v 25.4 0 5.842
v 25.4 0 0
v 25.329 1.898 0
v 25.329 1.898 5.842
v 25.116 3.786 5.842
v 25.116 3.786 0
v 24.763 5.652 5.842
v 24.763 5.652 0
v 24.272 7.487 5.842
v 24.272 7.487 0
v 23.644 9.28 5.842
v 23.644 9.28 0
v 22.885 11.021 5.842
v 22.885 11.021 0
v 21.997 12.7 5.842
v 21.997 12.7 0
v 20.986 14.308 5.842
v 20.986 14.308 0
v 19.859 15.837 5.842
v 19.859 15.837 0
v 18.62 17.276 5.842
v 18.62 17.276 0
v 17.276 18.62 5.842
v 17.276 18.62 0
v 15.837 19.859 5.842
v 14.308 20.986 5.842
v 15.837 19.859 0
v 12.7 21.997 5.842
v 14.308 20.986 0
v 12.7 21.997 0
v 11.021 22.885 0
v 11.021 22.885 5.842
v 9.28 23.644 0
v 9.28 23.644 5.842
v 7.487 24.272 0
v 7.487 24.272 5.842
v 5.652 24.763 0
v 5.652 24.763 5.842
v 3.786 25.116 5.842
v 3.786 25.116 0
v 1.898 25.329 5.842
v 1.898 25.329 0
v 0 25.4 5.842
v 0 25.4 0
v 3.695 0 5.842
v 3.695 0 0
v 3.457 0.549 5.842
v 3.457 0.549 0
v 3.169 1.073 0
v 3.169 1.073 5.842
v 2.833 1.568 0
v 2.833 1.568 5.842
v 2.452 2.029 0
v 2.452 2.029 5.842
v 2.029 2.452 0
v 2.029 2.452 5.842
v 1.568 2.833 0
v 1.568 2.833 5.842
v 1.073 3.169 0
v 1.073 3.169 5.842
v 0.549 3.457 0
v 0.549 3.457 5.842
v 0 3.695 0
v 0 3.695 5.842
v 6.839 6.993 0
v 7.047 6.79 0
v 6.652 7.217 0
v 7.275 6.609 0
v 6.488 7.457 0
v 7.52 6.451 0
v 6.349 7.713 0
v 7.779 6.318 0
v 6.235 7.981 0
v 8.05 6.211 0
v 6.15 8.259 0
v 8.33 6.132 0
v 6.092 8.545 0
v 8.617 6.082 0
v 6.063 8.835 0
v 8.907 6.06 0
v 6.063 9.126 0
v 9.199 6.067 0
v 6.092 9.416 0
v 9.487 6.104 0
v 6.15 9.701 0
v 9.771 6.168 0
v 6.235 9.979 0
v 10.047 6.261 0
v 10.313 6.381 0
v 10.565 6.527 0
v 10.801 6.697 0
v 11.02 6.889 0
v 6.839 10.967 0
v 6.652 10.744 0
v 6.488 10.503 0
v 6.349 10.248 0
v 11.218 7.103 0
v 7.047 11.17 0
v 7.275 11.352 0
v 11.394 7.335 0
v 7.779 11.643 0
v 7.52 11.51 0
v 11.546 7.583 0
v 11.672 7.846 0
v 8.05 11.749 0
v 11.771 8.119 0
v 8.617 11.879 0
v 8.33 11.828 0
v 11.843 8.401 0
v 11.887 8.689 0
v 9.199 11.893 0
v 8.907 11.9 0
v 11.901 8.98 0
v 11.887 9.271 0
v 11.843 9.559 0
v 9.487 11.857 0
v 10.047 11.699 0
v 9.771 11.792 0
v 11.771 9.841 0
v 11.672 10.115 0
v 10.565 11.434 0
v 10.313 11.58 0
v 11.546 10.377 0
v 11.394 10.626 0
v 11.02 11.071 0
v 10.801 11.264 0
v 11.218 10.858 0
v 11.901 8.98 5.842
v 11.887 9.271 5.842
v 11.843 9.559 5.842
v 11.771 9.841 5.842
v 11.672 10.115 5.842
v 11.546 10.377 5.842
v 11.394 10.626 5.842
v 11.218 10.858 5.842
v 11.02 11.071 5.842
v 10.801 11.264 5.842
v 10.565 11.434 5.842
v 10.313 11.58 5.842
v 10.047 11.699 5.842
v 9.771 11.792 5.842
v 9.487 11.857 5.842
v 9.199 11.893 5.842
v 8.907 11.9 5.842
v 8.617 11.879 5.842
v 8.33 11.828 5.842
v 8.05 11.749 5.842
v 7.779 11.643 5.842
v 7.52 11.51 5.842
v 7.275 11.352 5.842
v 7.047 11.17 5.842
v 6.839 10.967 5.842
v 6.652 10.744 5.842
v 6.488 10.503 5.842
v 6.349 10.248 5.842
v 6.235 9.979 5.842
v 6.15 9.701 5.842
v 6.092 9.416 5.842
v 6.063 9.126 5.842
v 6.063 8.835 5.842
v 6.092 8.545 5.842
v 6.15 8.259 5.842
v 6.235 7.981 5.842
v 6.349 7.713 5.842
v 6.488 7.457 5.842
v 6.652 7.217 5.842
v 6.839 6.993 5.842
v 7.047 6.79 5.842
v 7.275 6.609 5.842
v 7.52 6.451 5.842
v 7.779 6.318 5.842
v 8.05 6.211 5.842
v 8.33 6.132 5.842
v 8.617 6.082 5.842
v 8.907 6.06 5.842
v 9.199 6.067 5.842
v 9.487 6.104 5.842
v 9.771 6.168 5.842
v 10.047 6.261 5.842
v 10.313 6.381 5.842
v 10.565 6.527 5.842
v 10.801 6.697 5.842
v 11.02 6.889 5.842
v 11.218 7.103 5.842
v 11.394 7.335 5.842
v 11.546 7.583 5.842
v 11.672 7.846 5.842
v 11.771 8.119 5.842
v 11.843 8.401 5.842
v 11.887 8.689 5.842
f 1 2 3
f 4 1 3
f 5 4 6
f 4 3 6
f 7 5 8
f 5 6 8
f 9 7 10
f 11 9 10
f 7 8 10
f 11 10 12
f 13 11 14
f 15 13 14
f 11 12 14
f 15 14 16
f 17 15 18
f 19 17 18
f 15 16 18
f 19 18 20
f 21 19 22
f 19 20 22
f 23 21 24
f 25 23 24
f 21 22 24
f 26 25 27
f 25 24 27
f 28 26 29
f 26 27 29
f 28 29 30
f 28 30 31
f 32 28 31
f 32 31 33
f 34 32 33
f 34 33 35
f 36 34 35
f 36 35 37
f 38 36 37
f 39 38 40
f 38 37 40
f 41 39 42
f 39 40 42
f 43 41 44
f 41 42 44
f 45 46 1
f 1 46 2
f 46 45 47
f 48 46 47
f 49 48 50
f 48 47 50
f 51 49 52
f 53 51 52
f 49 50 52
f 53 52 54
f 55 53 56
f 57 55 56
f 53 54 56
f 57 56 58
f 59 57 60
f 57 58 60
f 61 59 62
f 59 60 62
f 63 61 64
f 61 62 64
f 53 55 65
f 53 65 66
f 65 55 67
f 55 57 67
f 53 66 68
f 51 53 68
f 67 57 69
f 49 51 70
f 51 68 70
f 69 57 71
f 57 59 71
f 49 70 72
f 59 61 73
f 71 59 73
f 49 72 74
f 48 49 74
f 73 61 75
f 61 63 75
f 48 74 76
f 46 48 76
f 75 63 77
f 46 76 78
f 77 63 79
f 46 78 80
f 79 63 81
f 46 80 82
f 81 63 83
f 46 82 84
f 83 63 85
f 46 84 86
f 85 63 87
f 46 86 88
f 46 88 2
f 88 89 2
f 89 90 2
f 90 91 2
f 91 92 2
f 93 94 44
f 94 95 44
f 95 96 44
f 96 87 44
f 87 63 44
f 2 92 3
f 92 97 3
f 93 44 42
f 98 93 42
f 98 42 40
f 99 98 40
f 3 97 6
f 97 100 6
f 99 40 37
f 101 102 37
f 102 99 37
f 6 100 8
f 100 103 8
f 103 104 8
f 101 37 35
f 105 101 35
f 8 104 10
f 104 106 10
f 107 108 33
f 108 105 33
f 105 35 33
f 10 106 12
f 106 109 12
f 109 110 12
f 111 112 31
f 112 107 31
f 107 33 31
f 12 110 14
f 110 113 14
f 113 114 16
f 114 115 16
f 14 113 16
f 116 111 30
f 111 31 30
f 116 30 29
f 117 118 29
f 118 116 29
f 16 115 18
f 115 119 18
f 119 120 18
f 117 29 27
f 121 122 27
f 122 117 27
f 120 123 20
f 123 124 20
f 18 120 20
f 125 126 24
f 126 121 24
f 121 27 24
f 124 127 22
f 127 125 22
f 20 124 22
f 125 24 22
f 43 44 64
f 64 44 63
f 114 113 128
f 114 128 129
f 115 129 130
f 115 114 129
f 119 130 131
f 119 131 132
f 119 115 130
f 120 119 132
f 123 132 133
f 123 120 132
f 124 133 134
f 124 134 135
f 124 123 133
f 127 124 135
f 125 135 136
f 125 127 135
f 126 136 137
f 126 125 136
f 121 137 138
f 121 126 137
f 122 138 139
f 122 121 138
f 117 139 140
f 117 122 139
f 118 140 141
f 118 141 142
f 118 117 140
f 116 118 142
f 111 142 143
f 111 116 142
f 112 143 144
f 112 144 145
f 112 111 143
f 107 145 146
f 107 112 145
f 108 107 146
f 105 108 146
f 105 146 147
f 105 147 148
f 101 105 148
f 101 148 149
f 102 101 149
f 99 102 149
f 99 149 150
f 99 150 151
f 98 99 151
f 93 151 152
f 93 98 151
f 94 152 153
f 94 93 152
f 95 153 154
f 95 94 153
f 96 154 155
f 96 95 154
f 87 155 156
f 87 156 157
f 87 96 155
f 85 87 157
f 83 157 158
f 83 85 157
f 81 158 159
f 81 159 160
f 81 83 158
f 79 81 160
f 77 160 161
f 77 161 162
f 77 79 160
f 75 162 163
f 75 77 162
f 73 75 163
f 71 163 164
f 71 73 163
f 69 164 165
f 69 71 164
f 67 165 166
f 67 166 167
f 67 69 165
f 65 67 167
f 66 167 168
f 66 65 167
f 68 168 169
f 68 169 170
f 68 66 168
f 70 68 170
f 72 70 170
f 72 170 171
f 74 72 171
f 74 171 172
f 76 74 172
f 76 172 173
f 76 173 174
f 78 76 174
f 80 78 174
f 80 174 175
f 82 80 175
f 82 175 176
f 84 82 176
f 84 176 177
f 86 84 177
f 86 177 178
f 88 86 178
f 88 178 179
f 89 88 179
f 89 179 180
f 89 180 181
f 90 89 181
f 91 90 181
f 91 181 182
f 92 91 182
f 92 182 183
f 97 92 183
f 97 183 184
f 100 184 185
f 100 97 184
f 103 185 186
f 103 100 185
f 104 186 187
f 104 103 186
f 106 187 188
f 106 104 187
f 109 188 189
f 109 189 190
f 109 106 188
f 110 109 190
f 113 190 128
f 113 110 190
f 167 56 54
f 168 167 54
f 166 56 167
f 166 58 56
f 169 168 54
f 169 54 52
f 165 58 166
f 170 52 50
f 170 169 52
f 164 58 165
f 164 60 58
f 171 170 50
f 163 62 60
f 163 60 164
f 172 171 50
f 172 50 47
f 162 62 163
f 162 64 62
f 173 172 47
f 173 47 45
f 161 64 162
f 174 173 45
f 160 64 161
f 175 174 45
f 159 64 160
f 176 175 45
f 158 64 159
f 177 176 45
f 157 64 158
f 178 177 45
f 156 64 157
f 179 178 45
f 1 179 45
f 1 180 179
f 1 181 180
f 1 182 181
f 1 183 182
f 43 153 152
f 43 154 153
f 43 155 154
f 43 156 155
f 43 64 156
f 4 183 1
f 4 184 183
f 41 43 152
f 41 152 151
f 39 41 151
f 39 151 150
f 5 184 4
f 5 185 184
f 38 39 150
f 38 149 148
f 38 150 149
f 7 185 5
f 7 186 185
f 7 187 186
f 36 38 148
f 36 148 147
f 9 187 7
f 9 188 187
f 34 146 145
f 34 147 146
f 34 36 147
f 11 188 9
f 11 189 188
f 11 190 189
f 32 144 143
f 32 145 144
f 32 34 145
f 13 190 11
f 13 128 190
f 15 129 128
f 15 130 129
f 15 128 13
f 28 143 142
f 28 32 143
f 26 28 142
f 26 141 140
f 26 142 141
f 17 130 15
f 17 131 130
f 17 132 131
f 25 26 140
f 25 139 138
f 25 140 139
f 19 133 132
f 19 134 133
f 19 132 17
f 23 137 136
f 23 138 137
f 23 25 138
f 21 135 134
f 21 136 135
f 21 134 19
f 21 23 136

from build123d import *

# Parameters (mm, degrees)
F0_R     = 2.921
F1_DEPTH = 5.842
F3_DEPTH = 5.842


with BuildPart() as f1:
    # F0 (on Top) → F1 (new body)
    with BuildSketch(Plane.XY):
        with BuildLine():
            Line((0, 25.4), (0, 0))
            Line((0, 0), (25.4, 0))
            ThreePointArc((25.4, 0), (17.9605122421, 17.9605122421), (0, 25.4))
        make_face()
        with Locations((8.9802561211, 8.9802561211)):
            Circle(F0_R, mode=Mode.SUBTRACT)
    extrude(amount=F1_DEPTH)

    # F2 (on face) → F3 (cut, through all)
    with BuildSketch(Plane.XY.offset(5.842)):
        with BuildLine():
            Line((0, 0), (3.6948170712, 0))
            ThreePointArc((3.6948170712, 0), (2.2450640303, 2.2450640303), (0, 3.6948170712))
            Line((0, 3.6948170712), (0, 0))
        make_face()
    extrude(amount=-F3_DEPTH, mode=Mode.SUBTRACT)


solid = f1.part
